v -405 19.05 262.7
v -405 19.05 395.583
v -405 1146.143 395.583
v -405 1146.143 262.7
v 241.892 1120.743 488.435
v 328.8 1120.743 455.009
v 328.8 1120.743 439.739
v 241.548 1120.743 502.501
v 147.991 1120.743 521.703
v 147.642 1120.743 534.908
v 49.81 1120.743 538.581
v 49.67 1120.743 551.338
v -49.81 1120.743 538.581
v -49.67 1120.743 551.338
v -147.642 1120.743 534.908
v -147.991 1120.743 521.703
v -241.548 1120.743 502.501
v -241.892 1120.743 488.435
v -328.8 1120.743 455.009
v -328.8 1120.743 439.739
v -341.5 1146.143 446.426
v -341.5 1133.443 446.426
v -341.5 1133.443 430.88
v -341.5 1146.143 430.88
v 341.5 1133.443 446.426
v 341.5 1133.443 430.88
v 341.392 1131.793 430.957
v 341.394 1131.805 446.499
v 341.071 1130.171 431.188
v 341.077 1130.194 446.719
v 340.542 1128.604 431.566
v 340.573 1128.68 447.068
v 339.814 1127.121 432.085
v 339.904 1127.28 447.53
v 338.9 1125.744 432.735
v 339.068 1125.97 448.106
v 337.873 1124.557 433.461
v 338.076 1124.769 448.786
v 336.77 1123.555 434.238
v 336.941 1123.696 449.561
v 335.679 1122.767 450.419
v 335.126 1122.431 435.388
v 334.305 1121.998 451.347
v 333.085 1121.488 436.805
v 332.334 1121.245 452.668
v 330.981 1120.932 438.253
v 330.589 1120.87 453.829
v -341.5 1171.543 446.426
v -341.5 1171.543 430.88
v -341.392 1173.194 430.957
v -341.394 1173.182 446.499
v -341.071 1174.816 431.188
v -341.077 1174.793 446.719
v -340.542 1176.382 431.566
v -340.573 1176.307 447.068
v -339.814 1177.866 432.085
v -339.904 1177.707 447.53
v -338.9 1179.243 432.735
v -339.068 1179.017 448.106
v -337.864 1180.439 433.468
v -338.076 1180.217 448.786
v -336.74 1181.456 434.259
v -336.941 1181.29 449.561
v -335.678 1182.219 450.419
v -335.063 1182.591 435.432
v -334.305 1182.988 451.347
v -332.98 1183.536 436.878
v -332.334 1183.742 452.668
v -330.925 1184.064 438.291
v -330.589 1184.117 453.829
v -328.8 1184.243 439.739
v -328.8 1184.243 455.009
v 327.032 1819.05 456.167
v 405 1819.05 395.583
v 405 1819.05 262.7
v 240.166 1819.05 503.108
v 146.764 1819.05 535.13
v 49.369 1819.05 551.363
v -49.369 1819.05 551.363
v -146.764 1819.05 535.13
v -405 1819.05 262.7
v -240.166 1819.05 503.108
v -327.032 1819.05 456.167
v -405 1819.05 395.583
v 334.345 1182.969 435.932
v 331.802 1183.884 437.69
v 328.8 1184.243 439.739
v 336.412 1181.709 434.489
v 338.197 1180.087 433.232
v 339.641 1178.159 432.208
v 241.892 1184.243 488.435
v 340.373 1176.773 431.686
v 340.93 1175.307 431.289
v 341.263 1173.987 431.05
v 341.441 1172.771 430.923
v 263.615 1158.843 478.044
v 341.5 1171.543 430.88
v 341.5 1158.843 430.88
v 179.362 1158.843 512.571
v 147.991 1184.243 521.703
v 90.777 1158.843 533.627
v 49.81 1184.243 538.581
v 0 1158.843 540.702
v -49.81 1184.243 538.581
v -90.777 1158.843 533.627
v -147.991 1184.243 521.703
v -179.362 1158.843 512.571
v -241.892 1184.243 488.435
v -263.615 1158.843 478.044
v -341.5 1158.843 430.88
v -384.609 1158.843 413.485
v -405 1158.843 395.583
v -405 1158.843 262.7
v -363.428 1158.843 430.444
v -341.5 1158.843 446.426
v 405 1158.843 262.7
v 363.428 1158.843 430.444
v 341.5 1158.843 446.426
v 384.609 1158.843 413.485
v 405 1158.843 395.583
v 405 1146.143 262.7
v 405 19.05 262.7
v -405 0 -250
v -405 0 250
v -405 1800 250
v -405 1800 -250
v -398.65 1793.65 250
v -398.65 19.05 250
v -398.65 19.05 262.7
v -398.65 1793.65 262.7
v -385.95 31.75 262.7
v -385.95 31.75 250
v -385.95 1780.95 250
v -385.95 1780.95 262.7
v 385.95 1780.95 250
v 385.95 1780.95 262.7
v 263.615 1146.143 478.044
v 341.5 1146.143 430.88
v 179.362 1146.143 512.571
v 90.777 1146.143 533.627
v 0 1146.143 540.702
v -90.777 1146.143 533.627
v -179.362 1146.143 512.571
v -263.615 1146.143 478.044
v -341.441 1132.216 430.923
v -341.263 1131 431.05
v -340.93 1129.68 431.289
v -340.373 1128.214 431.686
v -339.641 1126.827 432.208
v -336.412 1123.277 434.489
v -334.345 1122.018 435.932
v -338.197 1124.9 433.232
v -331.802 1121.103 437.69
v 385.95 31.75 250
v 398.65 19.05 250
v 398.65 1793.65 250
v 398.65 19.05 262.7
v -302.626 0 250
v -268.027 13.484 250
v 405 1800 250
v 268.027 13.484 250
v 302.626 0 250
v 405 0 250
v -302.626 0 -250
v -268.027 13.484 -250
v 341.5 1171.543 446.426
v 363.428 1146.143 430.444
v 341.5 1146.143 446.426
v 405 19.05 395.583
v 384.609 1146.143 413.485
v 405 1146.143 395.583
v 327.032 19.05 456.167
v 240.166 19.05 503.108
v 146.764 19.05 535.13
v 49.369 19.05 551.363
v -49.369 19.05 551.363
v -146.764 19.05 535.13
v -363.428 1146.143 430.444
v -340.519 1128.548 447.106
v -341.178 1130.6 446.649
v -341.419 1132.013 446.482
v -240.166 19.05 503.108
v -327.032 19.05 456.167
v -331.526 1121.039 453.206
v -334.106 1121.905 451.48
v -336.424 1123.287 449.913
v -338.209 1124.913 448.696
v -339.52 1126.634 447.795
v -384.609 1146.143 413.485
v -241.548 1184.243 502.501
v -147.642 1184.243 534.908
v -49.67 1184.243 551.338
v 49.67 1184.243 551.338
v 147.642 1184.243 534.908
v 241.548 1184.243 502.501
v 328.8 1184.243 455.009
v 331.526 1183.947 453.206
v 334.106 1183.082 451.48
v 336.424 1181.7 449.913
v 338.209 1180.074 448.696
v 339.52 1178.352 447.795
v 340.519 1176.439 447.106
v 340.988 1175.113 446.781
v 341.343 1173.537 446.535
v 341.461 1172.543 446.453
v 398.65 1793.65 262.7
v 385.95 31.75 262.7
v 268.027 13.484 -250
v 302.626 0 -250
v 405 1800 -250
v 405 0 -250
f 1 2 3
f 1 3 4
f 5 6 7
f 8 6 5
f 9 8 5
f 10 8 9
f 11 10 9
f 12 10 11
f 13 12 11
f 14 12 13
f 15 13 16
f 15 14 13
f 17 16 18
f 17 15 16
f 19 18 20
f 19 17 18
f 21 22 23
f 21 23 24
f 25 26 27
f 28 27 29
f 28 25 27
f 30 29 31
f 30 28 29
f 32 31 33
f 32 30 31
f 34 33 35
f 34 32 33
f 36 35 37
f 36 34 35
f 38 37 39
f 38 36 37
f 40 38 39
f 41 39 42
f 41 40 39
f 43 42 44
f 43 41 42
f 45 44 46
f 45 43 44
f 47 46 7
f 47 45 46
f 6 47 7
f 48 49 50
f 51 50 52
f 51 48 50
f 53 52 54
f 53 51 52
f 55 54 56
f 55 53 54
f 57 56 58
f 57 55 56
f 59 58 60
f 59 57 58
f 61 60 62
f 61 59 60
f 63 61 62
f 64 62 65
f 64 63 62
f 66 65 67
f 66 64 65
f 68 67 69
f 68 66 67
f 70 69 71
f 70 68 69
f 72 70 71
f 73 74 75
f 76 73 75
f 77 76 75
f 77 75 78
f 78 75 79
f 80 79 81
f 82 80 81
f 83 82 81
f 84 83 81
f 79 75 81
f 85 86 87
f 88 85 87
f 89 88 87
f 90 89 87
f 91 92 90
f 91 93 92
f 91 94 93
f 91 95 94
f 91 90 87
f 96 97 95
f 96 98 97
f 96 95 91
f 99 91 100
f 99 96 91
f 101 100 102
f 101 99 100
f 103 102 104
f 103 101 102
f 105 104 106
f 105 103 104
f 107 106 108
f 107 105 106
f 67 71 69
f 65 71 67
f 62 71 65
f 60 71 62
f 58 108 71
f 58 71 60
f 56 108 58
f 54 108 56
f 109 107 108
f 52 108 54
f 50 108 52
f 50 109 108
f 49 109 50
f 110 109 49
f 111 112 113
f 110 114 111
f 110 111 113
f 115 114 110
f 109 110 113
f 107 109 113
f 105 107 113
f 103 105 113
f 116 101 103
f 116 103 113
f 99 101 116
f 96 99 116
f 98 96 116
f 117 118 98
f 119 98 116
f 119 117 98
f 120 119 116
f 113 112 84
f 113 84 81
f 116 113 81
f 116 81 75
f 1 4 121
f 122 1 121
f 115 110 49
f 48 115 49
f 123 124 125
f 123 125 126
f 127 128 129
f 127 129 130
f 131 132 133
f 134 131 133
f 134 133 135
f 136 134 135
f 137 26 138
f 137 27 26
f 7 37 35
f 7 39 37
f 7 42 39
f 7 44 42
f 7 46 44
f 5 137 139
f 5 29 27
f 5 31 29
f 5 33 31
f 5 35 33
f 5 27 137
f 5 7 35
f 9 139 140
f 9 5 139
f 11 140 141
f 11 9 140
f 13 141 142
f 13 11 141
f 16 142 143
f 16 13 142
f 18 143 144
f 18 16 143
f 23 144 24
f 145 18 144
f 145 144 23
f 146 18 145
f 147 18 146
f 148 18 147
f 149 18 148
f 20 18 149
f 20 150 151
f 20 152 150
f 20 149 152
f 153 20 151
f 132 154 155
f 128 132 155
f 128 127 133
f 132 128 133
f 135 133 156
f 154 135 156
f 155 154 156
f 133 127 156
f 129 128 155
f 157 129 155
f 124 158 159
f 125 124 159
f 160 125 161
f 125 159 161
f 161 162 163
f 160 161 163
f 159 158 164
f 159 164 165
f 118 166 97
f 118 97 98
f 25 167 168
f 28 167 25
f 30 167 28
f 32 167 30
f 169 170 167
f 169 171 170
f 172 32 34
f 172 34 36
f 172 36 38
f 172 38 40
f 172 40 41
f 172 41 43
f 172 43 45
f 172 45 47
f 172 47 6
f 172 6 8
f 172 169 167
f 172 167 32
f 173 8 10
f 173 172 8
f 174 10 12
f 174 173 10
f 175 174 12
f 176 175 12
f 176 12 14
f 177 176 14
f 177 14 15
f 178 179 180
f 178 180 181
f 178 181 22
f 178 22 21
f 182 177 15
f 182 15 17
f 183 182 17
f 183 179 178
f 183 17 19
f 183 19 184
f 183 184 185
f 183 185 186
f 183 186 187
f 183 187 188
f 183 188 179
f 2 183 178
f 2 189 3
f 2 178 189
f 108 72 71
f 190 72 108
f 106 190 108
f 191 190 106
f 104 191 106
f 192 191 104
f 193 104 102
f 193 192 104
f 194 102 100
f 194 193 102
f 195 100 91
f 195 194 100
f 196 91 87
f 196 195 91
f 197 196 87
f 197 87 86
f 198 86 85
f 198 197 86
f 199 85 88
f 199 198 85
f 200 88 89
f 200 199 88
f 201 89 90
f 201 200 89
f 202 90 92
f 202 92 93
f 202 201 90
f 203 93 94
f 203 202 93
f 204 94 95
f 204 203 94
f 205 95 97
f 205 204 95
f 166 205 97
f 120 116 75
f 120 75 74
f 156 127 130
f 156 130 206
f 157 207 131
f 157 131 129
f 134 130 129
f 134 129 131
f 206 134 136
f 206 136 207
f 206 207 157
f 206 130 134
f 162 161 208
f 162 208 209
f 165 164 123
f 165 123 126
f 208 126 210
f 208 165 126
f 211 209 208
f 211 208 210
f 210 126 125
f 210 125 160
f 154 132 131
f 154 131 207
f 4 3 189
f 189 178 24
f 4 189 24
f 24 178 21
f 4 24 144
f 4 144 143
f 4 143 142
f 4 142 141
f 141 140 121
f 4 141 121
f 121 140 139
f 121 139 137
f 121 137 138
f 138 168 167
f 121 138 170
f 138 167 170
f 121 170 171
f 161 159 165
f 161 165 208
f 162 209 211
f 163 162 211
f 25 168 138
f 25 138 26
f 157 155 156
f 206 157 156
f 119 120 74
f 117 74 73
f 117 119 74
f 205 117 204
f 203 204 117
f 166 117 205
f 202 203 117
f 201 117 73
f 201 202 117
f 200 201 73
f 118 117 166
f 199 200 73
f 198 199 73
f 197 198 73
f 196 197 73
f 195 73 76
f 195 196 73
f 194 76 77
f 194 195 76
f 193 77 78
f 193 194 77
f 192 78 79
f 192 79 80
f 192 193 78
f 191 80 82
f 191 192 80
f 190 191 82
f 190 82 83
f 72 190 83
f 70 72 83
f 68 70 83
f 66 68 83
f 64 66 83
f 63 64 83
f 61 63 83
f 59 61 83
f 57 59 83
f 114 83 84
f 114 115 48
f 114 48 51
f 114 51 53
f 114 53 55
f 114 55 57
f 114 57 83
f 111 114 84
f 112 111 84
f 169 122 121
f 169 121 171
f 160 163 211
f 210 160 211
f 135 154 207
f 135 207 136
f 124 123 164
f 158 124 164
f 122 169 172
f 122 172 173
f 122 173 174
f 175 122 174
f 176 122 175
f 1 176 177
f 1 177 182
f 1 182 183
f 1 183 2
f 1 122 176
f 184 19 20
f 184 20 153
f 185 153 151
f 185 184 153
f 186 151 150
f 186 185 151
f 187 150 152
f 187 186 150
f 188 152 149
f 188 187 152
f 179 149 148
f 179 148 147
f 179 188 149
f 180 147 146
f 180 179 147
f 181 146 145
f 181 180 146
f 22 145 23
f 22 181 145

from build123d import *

# Parameters (mm, degrees)
SKETCH1_W               = 810
SKETCH1_H               = 500
BOSS_EXTRUDE1_DEPTH     = 1800
BOSS_EXTRUDE2_START     = 19.05
BOSS_EXTRUDE2_DEPTH     = 1800
SKETCH3_W               = 810
SKETCH3_H               = 12.7
CUT_EXTRUDE1_DEPTH      = 1712.976
CUT_EXTRUDE2_REACH      = 2031.39
CUT_EXTRUDE2_END_RADIUS = 585.872014924
SKETCH5_W               = 797.3
SKETCH5_H               = 1774.6
SKETCH5_W_2             = 771.9
SKETCH5_H_2             = 1749.2
EXTRUDE_THIN1_DEPTH     = 12.7
CUT_EXTRUDE3_DEPTH      = 1930.499391797


with BuildPart() as part:
    # Sketch1 → Boss-Extrude1 (new body)
    with BuildSketch(Plane(origin=(0, 0, 0), x_dir=(1, 0, 0), z_dir=(0, 1, 0))):
        Rectangle(SKETCH1_W, SKETCH1_H)
    extrude(amount=BOSS_EXTRUDE1_DEPTH)

    # Sketch6 → Cut-Extrude3 (cut, through all)
    with BuildSketch(Plane.XY.offset(250)):
        Polygon((-302.626047731, 0), (-268.027399007, 13.483618078), (268.027399007, 13.483618078), (302.626047731, 0), align=None)
    extrude(amount=-CUT_EXTRUDE3_DEPTH, mode=Mode.SUBTRACT)


with BuildPart() as body_2:
    # Sketch2 → Boss-Extrude2 (new body)
    with BuildSketch(Plane(origin=(0, 0, 0), x_dir=(1, 0, 0), z_dir=(0, 1, 0)).offset(BOSS_EXTRUDE2_START)):
        with BuildLine():
            Line((-405, -262.7), (405, -262.7))
            Line((405, -262.7), (405, -395.583268728))
            ThreePointArc((405, -395.583268728), (0, -553.402), (-405, -395.583268728))
            Line((-405, -395.583268728), (-405, -262.7))
        make_face()
    extrude(amount=BOSS_EXTRUDE2_DEPTH)

    # Sketch3 → Cut-Extrude1 (cut)
    with BuildSketch(Plane.XY.offset(553.402)):
        with Locations((0, 1152.493299562)):
            Rectangle(SKETCH3_W, SKETCH3_H)
    extrude(amount=-CUT_EXTRUDE1_DEPTH, mode=Mode.SUBTRACT)


with BuildPart() as cut_extrude1_piece_1:
    # of the separate pieces the step leaves, piece 1, a body of its own (cut_extrude1_pieces)
    add(body_2.part.solids().sort_by_distance((-405, 19.05, 395.583268728))[0])


with BuildPart() as cut_extrude1_piece_2:
    # of the separate pieces the step leaves, piece 2, a body of its own (cut_extrude1_pieces)
    add(body_2.part.solids().sort_by_distance((-405, 1158.843299562, 395.583268728))[0])


with BuildPart() as cut_extrude2_tool:
    # Cut-Extrude2: up to this cylinder (the profile starts outside it)
    cut_extrude2_end = Plane(origin=(0, 1152.4933, -45.170014924), z_dir=(0, -1, 0)) * Cylinder(CUT_EXTRUDE2_END_RADIUS, 5235.524029848, mode=Mode.PRIVATE)
    # Sketch4 → Cut-Extrude2 (new, up to the surface)
    with BuildSketch(Plane.XY.offset(553.402), mode=Mode.PRIVATE) as cut_extrude2_sk1:
        with BuildLine():
            Line((-328.8, 1184.243299562), (328.8, 1184.243299562))
            ThreePointArc((328.8, 1184.243299562), (337.780256121, 1180.523555683), (341.5, 1171.543299562))
            Line((341.5, 1171.543299562), (341.5, 1133.443299562))
            ThreePointArc((341.5, 1133.443299562), (337.780256121, 1124.463043441), (328.8, 1120.743299562))
            Line((328.8, 1120.743299562), (-328.8, 1120.743299562))
            ThreePointArc((-328.8, 1120.743299562), (-337.780256121, 1124.463043441), (-341.5, 1133.443299562))
            Line((-341.5, 1133.443299562), (-341.5, 1171.543299562))
            ThreePointArc((-341.5, 1171.543299562), (-337.780256121, 1180.523555683), (-328.8, 1184.243299562))
        make_face()
    cut_extrude2_tool1 = extrude(cut_extrude2_sk1.sketch, amount=-CUT_EXTRUDE2_REACH, mode=Mode.PRIVATE) - cut_extrude2_end
    add(cut_extrude2_tool1.solids().sort_by_distance((0, 1152.4933, 553.402))[0])


with BuildPart() as cut_extrude1_piece_1_1:
    add(cut_extrude1_piece_1.part)

    # Cut-Extrude2: cut by cut_extrude2_tool
    add(cut_extrude2_tool.part, mode=Mode.SUBTRACT)


with BuildPart() as cut_extrude1_piece_2_1:
    add(cut_extrude1_piece_2.part)

    # Cut-Extrude2: cut by cut_extrude2_tool
    add(cut_extrude2_tool.part, mode=Mode.SUBTRACT)


with BuildPart() as body_4:
    # Sketch5 → Extrude-Thin1 (new body)
    with BuildSketch(Plane.XY.offset(250)):
        with Locations((0, 906.35)):
            Rectangle(SKETCH5_W, SKETCH5_H)
        with Locations((0, 906.35)):
            Rectangle(SKETCH5_W_2, SKETCH5_H_2, mode=Mode.SUBTRACT)
    extrude(amount=EXTRUDE_THIN1_DEPTH)


solid = Compound([part.part, cut_extrude1_piece_1_1.part, cut_extrude1_piece_2_1.part, body_4.part])
